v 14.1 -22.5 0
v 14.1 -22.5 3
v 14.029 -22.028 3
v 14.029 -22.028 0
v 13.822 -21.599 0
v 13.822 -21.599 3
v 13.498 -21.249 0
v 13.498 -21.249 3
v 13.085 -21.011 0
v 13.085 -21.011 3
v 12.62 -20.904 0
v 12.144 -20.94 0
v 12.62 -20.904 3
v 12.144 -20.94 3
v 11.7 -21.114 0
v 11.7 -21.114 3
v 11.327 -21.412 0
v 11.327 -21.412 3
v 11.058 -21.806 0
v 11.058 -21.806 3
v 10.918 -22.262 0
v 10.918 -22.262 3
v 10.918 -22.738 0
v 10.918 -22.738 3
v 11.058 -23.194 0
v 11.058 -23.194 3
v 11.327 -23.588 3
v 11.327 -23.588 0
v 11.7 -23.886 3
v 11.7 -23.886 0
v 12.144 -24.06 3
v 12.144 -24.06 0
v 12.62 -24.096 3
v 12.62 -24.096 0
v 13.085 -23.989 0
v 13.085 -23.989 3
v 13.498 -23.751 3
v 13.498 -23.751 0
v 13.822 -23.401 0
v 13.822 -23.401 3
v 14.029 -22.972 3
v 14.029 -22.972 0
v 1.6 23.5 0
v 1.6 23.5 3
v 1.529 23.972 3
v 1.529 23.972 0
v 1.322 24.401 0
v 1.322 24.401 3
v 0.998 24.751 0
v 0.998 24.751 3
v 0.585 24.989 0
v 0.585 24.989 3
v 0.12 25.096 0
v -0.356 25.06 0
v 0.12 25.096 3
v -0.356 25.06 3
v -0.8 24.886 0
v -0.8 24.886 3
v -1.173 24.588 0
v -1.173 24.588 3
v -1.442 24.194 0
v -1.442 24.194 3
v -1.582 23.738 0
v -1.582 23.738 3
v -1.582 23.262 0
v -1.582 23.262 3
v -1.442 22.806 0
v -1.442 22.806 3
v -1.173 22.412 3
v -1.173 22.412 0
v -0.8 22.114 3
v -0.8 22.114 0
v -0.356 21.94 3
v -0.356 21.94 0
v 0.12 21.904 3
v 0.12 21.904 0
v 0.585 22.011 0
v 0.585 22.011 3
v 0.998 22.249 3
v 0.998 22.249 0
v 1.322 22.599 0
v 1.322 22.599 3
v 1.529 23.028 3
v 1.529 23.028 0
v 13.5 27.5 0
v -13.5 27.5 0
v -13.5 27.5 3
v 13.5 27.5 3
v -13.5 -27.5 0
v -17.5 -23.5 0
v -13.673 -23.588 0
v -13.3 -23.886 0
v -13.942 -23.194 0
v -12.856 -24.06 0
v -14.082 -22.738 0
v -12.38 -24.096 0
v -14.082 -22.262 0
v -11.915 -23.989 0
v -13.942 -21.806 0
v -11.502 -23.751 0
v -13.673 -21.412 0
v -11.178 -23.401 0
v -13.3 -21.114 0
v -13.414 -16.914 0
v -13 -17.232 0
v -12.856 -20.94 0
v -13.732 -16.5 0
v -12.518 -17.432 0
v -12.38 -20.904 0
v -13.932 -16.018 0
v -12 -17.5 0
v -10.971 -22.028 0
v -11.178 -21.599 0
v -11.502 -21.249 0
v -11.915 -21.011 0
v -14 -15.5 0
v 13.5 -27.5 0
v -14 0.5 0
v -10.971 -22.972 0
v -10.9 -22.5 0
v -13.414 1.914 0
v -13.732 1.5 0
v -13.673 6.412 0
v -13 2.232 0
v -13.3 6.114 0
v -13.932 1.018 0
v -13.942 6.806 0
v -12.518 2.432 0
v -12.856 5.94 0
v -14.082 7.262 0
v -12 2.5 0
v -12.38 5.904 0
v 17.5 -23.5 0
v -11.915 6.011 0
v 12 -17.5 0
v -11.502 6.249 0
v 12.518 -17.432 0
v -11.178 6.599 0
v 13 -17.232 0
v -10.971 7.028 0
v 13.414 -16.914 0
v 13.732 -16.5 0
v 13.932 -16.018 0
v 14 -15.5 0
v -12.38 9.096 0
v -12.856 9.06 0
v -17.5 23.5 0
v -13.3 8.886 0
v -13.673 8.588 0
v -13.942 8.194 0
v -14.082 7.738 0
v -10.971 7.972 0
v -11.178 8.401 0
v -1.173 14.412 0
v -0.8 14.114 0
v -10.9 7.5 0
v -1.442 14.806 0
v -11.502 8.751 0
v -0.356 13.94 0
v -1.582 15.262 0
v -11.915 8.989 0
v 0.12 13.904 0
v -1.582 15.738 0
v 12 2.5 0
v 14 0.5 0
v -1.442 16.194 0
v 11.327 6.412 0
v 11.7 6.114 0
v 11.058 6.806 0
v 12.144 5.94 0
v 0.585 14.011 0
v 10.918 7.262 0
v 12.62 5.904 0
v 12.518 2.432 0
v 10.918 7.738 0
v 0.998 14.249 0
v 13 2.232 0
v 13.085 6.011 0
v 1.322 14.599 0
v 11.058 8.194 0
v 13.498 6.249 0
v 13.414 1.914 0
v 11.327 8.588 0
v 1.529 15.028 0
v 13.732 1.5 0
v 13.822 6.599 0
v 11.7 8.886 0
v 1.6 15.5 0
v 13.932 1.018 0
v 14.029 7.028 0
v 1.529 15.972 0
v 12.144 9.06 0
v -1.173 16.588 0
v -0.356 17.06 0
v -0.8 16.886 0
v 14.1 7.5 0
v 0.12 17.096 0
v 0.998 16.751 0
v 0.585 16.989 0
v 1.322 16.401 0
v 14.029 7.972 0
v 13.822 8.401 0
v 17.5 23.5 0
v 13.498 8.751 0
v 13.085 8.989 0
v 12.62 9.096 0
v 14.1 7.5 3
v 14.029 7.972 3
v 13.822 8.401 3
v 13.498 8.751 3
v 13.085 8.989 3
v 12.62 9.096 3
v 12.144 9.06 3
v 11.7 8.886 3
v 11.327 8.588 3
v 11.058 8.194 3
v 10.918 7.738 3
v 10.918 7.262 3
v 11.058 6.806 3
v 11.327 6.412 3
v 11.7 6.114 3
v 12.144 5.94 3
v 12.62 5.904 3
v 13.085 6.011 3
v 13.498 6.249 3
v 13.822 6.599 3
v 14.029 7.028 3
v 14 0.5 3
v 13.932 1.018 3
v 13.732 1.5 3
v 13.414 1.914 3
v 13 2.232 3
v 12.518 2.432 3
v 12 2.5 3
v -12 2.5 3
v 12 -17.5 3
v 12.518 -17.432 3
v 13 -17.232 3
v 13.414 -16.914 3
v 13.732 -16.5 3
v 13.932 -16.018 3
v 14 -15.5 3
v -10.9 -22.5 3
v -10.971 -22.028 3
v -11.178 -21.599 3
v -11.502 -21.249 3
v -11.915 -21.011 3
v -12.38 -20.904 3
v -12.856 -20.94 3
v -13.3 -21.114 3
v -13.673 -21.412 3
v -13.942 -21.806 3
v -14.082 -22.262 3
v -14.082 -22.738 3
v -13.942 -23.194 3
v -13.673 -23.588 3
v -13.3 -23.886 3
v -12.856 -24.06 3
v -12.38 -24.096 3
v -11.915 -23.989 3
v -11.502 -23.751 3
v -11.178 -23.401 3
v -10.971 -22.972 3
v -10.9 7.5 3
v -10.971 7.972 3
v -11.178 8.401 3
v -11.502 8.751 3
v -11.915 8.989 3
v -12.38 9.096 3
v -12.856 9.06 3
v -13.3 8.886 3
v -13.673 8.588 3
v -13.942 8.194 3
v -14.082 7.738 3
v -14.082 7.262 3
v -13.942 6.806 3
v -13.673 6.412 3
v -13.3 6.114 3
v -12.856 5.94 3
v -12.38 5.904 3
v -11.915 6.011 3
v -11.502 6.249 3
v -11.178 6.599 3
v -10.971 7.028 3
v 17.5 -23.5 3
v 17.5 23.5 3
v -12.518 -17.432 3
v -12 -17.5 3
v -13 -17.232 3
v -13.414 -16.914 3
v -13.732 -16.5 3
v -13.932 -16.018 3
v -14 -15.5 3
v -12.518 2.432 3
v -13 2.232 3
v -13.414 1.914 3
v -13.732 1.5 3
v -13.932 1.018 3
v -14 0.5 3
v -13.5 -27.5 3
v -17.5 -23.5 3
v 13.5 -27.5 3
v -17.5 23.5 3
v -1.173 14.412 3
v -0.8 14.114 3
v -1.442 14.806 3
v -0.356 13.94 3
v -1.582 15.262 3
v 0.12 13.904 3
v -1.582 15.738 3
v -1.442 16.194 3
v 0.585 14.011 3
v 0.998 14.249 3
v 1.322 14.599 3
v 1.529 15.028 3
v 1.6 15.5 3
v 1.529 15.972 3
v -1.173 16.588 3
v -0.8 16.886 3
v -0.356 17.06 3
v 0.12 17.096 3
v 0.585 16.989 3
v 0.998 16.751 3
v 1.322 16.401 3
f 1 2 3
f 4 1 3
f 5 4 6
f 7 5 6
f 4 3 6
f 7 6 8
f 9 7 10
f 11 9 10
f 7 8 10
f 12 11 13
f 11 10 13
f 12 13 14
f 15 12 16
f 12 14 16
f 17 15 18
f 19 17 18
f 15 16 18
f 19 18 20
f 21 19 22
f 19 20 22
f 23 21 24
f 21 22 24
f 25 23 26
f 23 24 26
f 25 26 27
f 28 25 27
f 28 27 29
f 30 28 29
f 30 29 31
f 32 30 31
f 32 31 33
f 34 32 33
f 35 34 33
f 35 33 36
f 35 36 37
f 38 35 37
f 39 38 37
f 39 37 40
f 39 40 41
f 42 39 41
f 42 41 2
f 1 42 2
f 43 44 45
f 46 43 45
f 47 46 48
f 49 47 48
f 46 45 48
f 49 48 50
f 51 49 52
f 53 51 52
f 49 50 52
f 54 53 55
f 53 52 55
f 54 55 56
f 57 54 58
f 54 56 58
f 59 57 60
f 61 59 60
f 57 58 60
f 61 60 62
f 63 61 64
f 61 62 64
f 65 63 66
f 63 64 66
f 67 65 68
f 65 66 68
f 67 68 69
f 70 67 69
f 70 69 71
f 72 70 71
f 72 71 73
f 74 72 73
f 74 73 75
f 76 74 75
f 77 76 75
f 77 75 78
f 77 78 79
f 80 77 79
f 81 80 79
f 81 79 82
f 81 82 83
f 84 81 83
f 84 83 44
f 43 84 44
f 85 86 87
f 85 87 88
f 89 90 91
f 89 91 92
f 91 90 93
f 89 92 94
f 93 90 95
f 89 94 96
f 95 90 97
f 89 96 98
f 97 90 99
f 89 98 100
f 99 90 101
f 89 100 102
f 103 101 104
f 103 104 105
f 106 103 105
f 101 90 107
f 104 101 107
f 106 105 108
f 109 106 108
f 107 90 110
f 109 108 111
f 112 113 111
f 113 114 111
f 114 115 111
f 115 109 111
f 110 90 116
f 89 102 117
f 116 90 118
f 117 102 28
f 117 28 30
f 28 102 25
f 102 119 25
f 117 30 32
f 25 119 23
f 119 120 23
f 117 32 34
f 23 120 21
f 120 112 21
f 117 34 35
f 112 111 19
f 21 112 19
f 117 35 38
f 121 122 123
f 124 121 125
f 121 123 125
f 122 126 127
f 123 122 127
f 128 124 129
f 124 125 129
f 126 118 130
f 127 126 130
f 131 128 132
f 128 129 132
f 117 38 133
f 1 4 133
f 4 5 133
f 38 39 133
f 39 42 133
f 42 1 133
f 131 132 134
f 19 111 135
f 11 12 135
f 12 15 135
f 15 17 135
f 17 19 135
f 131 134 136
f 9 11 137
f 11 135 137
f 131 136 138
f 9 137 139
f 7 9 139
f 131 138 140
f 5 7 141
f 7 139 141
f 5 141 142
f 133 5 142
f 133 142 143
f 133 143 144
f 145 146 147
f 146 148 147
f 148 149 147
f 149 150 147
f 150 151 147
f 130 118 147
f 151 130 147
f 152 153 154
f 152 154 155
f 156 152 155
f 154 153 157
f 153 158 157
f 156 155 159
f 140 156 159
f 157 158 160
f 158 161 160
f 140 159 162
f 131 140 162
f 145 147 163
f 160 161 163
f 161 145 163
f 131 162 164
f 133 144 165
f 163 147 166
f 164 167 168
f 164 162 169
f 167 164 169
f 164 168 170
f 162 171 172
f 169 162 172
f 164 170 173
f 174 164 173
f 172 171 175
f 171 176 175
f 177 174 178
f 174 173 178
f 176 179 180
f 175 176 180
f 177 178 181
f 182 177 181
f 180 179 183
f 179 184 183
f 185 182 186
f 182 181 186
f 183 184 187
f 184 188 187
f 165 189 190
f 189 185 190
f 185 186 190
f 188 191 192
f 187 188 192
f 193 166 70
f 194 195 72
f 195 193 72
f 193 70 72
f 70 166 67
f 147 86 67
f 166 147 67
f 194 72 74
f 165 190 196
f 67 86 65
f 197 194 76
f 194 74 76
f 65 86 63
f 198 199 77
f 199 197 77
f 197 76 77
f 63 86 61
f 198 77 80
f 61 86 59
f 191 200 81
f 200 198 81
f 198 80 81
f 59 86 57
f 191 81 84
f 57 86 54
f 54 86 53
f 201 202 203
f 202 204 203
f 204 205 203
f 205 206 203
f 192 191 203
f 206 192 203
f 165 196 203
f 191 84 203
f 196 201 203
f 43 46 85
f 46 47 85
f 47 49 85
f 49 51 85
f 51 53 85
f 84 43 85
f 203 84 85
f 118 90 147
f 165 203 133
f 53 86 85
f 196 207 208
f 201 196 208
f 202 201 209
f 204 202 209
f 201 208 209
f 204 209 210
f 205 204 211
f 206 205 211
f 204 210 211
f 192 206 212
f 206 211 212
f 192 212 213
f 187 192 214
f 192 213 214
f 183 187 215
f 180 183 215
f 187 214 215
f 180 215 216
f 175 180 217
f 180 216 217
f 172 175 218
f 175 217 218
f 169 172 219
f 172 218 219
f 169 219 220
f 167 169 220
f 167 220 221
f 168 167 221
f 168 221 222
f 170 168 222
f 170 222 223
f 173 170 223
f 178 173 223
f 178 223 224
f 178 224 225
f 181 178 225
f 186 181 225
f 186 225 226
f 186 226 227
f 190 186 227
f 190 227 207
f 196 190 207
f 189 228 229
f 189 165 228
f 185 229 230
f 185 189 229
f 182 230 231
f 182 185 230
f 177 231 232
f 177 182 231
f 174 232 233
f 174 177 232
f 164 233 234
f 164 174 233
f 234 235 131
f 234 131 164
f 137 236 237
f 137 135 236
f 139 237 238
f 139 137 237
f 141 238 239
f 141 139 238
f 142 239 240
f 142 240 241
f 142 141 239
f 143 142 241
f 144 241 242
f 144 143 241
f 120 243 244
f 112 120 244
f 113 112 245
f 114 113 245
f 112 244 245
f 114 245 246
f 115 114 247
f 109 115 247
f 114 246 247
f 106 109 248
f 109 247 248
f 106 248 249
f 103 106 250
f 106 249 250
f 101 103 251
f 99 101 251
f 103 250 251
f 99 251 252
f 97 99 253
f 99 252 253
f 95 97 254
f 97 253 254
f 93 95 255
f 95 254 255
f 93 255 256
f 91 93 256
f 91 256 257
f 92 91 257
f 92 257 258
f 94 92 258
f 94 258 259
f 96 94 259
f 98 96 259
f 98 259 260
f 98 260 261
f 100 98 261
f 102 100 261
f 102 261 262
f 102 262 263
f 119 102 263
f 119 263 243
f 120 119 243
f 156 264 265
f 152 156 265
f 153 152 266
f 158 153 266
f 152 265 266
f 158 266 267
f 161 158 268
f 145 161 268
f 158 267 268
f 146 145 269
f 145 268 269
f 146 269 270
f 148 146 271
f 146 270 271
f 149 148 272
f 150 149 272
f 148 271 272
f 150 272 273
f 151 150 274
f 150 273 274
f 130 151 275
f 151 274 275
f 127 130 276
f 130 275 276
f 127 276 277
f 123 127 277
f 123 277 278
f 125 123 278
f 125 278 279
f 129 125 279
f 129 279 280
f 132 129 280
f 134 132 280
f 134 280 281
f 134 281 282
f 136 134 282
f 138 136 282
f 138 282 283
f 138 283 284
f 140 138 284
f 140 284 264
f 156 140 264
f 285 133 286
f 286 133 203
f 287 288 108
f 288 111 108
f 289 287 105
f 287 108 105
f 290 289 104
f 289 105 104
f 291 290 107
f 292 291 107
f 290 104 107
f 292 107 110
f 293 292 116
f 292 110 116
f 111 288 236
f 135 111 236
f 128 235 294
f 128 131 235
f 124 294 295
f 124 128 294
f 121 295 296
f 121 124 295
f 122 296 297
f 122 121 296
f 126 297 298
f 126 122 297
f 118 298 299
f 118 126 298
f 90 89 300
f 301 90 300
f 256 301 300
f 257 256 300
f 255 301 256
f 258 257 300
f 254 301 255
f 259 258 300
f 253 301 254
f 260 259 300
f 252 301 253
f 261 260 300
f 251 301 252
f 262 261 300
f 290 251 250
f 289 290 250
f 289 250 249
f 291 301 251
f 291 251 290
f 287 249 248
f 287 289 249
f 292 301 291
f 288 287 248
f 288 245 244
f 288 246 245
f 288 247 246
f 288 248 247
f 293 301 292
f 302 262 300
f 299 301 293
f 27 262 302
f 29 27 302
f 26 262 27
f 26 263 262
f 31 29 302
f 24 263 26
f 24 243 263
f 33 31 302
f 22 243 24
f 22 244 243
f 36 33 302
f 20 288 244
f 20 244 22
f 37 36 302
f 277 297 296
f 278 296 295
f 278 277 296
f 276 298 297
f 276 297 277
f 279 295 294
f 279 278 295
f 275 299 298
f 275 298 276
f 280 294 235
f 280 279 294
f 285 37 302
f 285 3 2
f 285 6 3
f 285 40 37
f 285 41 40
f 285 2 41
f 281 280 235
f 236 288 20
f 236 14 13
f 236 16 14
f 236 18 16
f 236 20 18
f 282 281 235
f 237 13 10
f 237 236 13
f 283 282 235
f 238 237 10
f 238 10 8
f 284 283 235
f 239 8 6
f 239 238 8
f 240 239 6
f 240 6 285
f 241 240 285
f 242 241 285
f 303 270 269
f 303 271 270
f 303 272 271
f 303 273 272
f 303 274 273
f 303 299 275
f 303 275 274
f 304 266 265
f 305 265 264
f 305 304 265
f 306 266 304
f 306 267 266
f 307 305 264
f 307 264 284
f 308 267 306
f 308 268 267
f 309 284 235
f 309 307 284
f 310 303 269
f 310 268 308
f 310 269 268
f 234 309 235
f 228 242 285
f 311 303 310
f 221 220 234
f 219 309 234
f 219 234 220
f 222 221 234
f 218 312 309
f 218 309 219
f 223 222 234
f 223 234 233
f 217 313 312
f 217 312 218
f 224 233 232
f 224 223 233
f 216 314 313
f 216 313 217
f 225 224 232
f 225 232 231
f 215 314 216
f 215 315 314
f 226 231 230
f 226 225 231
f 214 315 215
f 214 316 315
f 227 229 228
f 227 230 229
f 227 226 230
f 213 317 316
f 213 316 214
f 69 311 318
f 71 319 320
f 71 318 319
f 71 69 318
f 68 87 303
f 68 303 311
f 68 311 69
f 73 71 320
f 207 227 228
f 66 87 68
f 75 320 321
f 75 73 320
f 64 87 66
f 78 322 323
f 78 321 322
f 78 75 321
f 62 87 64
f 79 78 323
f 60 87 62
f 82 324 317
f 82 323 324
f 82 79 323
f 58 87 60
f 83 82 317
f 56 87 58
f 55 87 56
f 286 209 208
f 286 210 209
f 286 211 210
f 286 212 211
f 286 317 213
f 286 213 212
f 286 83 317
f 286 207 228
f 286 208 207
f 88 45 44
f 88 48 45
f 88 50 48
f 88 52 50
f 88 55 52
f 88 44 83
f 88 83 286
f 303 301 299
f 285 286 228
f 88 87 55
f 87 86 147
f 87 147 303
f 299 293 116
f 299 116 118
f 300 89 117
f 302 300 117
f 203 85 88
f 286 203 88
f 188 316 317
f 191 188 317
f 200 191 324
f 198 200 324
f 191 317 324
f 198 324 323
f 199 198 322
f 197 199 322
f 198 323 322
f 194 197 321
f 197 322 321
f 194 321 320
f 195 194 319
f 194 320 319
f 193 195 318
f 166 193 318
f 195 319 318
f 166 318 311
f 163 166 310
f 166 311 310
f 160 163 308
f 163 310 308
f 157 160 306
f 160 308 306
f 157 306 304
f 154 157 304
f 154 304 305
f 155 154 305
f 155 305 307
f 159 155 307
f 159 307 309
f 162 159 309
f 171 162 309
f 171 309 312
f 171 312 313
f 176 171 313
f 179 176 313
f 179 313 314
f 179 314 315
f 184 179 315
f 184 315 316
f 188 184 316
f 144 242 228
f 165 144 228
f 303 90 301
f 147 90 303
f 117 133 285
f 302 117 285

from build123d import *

# Parameters (mm, degrees)
SKETCH_1_W                  = 35
SKETCH_1_H                  = 55
EXTRUDE_1_DEPTH             = 3
CHAMFER_1_SIZE              = 4
SKETCH_2_R                  = 1.6
CUT_EXTRUDE_1_DEPTH         = 33.733774607
PATTERN_LINEAR_1_COUNT      = 2
PATTERN_LINEAR_1_PITCH      = 25
PATTERN_LINEAR_1_COUNT_DIR2 = 2
PATTERN_LINEAR_1_PITCH_DIR2 = 30
SKETCH_3_R                  = 1.6
CUT_EXTRUDE_2_DEPTH         = 33.733774607
PATTERN_LINEAR_2_COUNT      = 2
PATTERN_LINEAR_2_PITCH      = 8
SKETCH_4_W                  = 28
SKETCH_4_H                  = 20
CUT_EXTRUDE_3_DEPTH         = 33.733774607
FILLET_1_R                  = 2


with BuildPart() as part:
    # 草圖1 → 填料-伸長1 (new body)
    with BuildSketch(Plane.XY):
        Rectangle(SKETCH_1_W, SKETCH_1_H)
    extrude(amount=EXTRUDE_1_DEPTH)

    # 導角1
    chamfer_1_edges = [part.edges().sort_by_distance(p)[0] for p in [
        (-17.5, 27.5, 1.5),
        (17.5, 27.5, 1.5),
        (17.5, -27.5, 1.5),
        (-17.5, -27.5, 1.5),
    ]]
    chamfer(chamfer_1_edges, length=CHAMFER_1_SIZE)

    # 草圖2 → 除料-伸長1 (cut, through all)
    with BuildSketch(Plane.XY.offset(3)):
        with Locations((-12.5, 7.5)):
            Circle(SKETCH_2_R)
    cut_extrude_1 = extrude(amount=-CUT_EXTRUDE_1_DEPTH, mode=Mode.SUBTRACT)

    # 直線複製排列1: Cut-Extrude 1 2 × 2
    with Locations(*[(i * PATTERN_LINEAR_1_PITCH, -j * PATTERN_LINEAR_1_PITCH_DIR2, 0) for i in range(PATTERN_LINEAR_1_COUNT) for j in range(PATTERN_LINEAR_1_COUNT_DIR2) if (i, j) != (0, 0)]):
        add(cut_extrude_1, mode=Mode.SUBTRACT)

    # 草圖3 → 除料-伸長2 (cut, through all)
    with BuildSketch(Plane.XY.offset(3)):
        with Locations((0, 23.5)):
            Circle(SKETCH_3_R)
    cut_extrude_2 = extrude(amount=-CUT_EXTRUDE_2_DEPTH, mode=Mode.SUBTRACT)

    # 直線複製排列2: 除料-伸長2 ×2
    with Locations(*[(0, -i * PATTERN_LINEAR_2_PITCH, 0) for i in range(1, PATTERN_LINEAR_2_COUNT)]):
        add(cut_extrude_2, mode=Mode.SUBTRACT)

    # 草圖4 → 除料-伸長3 (cut, through all)
    with BuildSketch(Plane.XY.offset(3)):
        with Locations((0, -7.5)):
            Rectangle(SKETCH_4_W, SKETCH_4_H)
    extrude(amount=-CUT_EXTRUDE_3_DEPTH, mode=Mode.SUBTRACT)

    # 圓角1
    fillet_1_edges = [part.edges().sort_by_distance(p)[0] for p in [
        (-14, -17.5, 1.5),
        (-14, 2.5, 1.5),
        (14, 2.5, 1.5),
        (14, -17.5, 1.5),
    ]]
    fillet(fillet_1_edges, radius=FILLET_1_R)


solid = part.part
